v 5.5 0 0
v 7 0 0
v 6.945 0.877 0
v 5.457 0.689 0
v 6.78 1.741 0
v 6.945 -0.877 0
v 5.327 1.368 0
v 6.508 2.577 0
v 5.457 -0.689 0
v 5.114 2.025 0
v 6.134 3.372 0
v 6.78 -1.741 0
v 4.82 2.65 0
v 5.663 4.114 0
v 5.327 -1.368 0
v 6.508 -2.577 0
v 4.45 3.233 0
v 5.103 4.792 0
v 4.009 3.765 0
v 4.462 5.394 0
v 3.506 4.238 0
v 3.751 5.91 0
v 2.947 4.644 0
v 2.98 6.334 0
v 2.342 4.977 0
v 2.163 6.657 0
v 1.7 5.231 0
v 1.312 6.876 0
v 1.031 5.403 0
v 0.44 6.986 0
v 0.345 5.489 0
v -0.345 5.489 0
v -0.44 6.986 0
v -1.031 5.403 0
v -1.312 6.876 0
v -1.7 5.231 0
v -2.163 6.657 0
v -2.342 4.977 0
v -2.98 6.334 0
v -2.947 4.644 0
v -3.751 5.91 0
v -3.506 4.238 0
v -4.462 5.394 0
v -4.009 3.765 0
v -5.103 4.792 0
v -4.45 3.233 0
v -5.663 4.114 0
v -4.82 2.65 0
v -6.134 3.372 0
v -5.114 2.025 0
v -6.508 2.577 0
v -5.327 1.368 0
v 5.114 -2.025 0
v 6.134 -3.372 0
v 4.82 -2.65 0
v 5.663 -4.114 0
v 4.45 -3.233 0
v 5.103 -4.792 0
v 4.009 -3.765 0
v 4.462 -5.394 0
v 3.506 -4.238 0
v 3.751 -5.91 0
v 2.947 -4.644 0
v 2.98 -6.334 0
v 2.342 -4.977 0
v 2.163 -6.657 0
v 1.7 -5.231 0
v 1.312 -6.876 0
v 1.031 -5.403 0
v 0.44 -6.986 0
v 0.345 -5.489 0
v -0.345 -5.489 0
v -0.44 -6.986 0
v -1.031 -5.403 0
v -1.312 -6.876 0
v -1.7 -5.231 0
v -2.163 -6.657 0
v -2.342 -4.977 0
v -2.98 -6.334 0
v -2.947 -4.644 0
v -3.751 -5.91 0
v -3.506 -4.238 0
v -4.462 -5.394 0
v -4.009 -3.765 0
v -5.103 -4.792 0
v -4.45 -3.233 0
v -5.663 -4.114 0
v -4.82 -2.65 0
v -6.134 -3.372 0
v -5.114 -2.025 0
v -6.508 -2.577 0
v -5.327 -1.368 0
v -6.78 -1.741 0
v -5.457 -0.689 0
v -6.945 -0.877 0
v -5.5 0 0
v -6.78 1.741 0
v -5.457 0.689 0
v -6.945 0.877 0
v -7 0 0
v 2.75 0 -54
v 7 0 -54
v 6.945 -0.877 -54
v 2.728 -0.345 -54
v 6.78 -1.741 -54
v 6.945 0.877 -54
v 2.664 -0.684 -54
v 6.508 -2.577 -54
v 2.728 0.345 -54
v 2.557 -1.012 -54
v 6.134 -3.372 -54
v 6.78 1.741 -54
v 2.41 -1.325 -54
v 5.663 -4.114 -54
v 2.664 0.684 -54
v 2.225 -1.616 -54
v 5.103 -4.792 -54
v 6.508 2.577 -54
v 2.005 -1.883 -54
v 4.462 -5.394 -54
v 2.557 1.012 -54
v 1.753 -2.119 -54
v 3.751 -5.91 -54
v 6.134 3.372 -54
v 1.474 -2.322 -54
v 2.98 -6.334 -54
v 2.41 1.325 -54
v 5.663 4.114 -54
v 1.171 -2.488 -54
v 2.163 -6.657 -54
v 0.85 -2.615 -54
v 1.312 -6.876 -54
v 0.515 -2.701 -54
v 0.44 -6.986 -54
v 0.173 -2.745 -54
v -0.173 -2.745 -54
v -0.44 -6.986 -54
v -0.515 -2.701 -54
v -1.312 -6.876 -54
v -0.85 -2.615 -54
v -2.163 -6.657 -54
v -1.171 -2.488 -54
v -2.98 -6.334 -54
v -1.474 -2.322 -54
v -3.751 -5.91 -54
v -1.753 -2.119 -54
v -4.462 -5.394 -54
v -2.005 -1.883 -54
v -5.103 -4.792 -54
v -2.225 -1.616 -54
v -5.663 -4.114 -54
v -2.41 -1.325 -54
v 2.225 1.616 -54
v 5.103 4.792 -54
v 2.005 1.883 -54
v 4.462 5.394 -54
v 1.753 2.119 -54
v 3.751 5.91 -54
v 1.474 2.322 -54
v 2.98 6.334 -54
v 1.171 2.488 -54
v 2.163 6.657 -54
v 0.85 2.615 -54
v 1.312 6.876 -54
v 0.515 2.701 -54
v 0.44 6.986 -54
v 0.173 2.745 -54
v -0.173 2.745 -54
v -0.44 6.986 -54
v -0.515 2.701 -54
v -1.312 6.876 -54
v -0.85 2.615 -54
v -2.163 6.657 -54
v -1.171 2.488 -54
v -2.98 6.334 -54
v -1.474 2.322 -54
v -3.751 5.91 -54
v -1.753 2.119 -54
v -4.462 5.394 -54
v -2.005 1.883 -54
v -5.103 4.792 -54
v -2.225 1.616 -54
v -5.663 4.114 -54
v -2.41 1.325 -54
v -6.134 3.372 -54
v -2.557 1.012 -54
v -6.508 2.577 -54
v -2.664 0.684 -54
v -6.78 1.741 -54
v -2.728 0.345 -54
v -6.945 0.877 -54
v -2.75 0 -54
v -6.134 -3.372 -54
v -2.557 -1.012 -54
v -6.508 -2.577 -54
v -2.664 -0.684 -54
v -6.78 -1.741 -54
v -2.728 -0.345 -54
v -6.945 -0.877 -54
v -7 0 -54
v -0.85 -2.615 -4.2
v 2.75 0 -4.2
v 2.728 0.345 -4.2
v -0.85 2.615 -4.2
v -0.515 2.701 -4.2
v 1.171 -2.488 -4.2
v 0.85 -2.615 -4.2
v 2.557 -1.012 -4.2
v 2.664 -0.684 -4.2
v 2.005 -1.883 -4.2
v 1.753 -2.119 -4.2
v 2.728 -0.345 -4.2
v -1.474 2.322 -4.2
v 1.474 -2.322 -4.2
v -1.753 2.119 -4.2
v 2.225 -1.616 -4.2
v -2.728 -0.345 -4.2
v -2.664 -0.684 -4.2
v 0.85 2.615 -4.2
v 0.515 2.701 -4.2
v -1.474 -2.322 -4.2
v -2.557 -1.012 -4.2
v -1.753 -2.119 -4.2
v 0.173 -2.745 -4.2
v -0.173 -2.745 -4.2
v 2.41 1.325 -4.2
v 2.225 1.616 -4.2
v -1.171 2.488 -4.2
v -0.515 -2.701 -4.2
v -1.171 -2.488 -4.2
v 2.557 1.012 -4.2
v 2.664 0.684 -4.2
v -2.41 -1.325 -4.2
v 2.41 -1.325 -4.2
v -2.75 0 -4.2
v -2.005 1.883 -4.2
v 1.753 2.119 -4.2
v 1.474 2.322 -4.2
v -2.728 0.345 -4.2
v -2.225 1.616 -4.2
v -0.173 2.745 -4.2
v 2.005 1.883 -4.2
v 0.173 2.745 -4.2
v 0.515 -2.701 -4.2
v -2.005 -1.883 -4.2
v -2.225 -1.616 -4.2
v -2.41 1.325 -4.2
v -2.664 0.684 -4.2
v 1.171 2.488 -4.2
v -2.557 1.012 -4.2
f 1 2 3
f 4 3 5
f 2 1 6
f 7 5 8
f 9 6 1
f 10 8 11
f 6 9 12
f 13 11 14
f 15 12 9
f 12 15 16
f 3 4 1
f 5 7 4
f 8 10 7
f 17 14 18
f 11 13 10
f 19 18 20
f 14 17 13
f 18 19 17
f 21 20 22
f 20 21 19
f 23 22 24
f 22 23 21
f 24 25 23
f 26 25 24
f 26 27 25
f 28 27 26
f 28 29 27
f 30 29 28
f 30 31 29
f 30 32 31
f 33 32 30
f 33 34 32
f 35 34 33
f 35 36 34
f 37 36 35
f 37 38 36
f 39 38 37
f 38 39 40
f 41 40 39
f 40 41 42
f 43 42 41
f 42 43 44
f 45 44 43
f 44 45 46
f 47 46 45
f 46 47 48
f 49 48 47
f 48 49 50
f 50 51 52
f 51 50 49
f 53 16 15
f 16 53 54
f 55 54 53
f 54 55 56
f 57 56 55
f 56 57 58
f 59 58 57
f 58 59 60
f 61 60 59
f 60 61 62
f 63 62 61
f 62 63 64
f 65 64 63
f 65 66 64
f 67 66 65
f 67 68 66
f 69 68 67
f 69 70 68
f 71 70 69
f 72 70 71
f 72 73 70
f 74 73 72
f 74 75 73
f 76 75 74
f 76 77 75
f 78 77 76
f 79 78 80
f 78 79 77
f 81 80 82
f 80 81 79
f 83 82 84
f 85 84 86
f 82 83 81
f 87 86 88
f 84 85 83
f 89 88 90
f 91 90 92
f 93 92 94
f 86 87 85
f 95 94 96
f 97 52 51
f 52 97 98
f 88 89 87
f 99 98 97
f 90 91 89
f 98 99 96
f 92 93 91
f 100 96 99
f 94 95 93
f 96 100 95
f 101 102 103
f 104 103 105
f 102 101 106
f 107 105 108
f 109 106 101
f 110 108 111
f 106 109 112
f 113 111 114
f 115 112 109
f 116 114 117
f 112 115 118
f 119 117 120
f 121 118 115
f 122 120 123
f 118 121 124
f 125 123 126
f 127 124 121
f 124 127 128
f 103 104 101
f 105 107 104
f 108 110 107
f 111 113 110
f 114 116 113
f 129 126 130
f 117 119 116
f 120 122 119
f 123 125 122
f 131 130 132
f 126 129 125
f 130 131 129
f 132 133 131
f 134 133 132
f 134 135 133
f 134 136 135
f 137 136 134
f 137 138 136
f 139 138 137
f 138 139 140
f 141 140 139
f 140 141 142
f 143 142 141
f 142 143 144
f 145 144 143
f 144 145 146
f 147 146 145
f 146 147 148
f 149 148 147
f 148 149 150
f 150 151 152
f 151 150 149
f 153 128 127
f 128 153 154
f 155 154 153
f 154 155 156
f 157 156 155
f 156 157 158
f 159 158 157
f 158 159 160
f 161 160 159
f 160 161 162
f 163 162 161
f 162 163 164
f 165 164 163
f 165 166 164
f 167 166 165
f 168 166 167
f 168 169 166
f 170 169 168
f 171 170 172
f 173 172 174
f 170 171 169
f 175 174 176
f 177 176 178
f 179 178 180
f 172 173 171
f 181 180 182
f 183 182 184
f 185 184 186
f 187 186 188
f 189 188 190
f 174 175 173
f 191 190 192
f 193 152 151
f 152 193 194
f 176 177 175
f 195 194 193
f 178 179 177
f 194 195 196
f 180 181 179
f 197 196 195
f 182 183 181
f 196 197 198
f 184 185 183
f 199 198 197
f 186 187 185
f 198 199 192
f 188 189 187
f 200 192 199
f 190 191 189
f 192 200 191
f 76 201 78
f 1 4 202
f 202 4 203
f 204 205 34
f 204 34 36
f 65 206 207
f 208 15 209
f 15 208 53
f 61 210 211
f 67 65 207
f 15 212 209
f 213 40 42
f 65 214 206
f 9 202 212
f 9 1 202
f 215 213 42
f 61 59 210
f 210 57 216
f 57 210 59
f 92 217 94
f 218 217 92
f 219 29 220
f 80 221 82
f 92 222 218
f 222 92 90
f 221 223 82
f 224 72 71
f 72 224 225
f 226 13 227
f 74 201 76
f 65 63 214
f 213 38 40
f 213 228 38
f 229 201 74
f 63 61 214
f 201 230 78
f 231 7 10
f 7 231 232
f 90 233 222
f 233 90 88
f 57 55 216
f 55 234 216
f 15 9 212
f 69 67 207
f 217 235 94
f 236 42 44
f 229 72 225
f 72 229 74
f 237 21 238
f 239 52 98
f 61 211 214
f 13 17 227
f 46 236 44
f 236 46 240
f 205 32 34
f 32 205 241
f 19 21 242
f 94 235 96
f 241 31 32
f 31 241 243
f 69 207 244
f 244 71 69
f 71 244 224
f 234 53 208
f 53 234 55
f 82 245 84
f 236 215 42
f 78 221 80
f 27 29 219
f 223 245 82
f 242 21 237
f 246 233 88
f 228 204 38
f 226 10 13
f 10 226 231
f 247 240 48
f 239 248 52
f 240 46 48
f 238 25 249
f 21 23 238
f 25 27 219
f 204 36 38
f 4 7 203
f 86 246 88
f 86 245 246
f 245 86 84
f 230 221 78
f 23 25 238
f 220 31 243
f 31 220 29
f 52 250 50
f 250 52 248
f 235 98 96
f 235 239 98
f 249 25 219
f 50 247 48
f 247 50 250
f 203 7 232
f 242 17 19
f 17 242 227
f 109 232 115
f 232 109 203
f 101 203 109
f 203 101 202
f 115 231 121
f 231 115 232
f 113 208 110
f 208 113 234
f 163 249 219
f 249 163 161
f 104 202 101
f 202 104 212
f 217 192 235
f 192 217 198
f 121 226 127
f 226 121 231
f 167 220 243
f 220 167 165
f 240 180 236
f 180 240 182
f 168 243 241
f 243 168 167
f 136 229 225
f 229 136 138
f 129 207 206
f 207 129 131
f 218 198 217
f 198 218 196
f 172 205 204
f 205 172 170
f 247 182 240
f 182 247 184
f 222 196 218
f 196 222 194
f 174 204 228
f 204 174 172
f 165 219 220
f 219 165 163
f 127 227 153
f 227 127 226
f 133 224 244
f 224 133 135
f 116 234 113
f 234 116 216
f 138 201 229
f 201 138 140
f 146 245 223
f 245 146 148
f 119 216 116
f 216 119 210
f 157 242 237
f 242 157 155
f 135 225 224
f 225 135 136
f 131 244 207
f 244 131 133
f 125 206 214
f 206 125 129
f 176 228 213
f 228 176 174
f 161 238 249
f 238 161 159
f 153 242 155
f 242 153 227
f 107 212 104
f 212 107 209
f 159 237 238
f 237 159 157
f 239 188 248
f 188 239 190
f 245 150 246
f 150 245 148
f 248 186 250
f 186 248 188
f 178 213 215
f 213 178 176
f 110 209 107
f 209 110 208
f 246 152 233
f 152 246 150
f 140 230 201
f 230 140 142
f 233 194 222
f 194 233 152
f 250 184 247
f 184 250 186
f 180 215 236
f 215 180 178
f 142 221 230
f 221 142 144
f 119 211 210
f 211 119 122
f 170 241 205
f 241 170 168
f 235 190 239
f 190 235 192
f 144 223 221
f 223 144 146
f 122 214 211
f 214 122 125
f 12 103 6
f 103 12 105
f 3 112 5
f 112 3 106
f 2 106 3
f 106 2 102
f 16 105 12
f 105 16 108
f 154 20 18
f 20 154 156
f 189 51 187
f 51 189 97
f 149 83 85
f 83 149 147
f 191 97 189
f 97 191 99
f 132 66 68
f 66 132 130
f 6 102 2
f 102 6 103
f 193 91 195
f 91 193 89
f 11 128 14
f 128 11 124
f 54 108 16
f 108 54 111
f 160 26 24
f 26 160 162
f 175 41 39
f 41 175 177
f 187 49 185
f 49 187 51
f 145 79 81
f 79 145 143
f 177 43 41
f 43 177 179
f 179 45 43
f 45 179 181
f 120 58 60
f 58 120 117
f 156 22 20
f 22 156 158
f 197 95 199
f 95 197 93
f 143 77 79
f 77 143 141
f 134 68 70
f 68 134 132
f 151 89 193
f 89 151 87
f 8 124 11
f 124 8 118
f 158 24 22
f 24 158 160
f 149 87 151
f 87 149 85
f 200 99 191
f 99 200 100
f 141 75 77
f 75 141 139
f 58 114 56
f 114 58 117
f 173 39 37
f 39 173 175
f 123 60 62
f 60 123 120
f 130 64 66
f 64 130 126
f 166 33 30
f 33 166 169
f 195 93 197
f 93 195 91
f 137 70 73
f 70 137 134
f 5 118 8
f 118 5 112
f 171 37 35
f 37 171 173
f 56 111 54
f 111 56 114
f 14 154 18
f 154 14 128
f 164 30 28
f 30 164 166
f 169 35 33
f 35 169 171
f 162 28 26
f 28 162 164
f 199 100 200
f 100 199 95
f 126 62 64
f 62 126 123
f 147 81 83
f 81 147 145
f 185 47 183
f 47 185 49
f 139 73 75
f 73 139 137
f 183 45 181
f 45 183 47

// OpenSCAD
$fn = 50;


difference() {
	union() {
		translate(v = [0, 0, -54.0000000000]) {
			cylinder(h = 54, r = 7.0000000000);
		}
		cylinder(h = 0, r = 10.0000000000);
	}
	union() {
		translate(v = [0, 0, 0]) {
			rotate(a = [0, 0, 0]) {
				difference() {
					union() {
						#translate(v = [0, 0, -54.0000000000]) {
							cylinder(h = 54, r = 2.2500000000);
						}
						#translate(v = [0, 0, -4.2000000000]) {
							cylinder(h = 4.2000000000, r1 = 2.7500000000, r2 = 5.5000000000);
						}
						#translate(v = [0, 0, -54.0000000000]) {
							cylinder(h = 54, r = 2.7500000000);
						}
						#translate(v = [0, 0, -54.0000000000]) {
							cylinder(h = 54, r = 2.2500000000);
						}
					}
					union();
				}
			}
		}
	}
}
